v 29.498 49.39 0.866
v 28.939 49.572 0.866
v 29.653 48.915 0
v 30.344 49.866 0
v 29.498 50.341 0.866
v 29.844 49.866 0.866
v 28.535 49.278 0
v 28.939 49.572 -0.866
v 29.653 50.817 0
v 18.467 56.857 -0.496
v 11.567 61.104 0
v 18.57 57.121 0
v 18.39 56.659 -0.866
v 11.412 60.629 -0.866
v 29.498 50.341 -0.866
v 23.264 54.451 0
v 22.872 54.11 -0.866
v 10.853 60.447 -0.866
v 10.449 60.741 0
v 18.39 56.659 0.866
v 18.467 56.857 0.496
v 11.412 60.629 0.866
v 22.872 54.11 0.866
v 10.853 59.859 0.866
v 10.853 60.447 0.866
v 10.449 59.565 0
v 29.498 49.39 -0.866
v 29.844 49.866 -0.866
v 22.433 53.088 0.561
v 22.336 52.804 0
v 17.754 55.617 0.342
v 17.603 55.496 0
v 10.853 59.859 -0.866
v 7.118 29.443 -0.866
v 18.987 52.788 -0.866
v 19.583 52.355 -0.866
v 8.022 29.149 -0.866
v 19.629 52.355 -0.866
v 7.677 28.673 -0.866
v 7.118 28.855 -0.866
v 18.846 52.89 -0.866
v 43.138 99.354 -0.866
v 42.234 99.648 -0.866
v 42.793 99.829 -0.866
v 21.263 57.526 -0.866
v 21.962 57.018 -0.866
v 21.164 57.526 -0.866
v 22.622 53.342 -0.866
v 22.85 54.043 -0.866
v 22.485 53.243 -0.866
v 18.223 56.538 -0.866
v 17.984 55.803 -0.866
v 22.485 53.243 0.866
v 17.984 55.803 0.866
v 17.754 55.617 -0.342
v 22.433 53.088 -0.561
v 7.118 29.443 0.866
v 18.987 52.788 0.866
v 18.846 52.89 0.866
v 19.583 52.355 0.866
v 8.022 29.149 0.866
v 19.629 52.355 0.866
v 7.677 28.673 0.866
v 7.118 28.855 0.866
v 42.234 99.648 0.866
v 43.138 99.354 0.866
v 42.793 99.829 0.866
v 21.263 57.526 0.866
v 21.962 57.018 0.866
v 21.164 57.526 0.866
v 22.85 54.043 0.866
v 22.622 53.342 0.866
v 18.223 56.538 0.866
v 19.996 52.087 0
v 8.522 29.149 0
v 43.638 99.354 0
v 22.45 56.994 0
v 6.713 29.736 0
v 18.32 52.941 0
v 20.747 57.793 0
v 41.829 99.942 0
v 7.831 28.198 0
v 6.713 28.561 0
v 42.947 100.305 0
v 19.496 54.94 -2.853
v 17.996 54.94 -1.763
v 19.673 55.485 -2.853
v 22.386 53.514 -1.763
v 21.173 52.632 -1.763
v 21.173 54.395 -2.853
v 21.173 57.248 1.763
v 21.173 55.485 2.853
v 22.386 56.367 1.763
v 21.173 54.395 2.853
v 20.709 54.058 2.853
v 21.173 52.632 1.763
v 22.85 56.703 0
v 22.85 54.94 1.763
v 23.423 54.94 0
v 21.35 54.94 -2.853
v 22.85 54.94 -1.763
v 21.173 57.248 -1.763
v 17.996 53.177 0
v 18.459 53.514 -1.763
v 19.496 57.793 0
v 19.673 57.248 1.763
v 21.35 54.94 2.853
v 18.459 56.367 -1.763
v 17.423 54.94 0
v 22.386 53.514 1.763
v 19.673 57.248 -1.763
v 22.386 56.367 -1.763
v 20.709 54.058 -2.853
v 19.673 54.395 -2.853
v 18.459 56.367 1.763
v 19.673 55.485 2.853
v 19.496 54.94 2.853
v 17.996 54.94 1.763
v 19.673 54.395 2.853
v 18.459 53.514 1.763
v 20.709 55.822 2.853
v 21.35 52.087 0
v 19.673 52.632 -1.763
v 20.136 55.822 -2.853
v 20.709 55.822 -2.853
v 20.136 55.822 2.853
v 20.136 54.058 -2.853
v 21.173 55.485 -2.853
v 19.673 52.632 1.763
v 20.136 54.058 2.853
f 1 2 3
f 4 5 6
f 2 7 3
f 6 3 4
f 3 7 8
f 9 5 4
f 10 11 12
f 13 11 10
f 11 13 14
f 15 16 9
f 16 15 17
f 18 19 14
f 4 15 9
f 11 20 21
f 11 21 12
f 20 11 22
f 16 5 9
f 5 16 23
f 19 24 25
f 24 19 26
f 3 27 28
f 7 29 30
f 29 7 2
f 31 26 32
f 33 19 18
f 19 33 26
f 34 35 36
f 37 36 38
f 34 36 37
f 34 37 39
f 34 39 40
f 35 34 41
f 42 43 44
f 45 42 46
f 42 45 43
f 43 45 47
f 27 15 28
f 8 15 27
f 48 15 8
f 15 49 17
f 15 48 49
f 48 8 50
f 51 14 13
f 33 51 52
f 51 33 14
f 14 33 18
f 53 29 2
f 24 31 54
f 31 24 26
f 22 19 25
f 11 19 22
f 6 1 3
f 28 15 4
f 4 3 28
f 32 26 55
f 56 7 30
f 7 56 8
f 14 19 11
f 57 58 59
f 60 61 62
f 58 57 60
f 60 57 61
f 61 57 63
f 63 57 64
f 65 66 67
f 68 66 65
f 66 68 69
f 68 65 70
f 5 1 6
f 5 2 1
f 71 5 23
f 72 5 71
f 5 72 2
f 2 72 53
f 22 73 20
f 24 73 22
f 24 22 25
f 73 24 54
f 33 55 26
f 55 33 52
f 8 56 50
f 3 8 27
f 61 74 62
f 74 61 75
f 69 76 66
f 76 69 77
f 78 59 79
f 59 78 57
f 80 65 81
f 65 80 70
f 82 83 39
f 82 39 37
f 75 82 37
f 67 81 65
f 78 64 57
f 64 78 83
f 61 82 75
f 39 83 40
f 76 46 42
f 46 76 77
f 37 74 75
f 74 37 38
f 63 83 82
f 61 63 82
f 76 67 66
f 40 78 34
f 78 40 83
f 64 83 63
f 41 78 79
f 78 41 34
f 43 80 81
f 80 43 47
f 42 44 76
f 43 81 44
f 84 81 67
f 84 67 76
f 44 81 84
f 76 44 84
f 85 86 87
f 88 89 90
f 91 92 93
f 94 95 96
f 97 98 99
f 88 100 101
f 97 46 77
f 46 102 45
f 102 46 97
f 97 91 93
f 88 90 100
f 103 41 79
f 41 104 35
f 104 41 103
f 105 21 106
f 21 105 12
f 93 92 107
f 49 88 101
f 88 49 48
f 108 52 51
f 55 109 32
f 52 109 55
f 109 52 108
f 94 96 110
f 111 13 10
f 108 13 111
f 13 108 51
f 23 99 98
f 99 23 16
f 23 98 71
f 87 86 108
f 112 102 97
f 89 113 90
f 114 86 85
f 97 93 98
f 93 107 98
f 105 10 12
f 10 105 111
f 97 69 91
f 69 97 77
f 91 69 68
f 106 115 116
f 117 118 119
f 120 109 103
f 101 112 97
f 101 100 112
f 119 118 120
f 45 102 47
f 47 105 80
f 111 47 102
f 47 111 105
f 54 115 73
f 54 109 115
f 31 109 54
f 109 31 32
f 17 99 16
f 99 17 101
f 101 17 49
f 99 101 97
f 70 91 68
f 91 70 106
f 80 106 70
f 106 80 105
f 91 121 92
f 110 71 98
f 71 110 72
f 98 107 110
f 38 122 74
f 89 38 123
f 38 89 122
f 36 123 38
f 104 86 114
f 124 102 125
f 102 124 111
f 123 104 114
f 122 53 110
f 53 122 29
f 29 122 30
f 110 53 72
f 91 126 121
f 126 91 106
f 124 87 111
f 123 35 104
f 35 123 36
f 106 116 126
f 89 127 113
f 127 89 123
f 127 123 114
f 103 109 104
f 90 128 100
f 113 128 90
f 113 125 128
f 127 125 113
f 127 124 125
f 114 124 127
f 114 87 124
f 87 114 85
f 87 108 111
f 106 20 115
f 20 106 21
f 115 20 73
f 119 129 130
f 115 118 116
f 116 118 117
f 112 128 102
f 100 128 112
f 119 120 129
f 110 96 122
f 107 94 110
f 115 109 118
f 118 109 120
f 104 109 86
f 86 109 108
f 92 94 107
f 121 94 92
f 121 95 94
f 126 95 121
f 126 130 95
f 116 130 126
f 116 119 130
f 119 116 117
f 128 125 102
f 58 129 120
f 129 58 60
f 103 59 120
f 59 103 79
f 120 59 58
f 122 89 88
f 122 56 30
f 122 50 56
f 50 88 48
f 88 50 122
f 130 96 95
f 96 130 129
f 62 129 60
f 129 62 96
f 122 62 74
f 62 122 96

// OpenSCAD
//found there: https://openscadsnippetpad.blogspot.com/2017/06/intersection-of-lines.html

function  IntersectionOfLines(pa1, pa2, pb1, pb2)=
let(
da = [(pa1.x-pa2.x),(pa1.y-pa2.y)], 
db = [(pb1.x-pb2.x),(pb1.y-pb2.y)],
the = da.x*db.y - da.y*db.x                 )
(the == 0)? 
undef: /* no intersection*/
let (
A = (pa1.x * pa2.y - pa1.y * pa2.x),
B = (pb1.x * pb2.y - pb1.y * pb2.x)         )
[( A*db.x - da.x*B ) / the , ( A*db.y - da.y*B ) / the]
;

// demo code
pa1=[rnd(100),rnd(100)];
pa2 =[rnd(100),rnd(100)];
pb1=[rnd(100),rnd(100)];
pb2=[rnd(100),rnd(100)];
I=IntersectionOfLines(pa1, pa2, pb1, pb2);
line(pa1, pa2);
line(pb1, pb2);


// show in red if intersecting 
// else extend linese outside segments
if(I.x>min(pa1.x,pa2.x)&&I.x<max(pa1.x,pa2.x)
&&I.y>min(pa1.y,pa2.y)&&I.y<max(pa1.y,pa2.y))
{color("red")translate(I) sphere(3);
}
else{
translate(I) sphere(3);
hull(){
translate(I) sphere(0.5);
translate(pa1) sphere(0.5);}
hull(){
translate(I) sphere(0.5);
translate(pb1) sphere(0.5);}
}


echo(I);

module line(p1,p2){hull(){
translate(p1) sphere(1);
translate(p2) sphere(1);
}}

function rnd(a = 1, b = 0, s = []) =
s == [] ?
  (rands(min(a, b), max(
    a, b), 1)[0]) :
  (rands(min(a, b), max(a, b), 1, s)[0]);
